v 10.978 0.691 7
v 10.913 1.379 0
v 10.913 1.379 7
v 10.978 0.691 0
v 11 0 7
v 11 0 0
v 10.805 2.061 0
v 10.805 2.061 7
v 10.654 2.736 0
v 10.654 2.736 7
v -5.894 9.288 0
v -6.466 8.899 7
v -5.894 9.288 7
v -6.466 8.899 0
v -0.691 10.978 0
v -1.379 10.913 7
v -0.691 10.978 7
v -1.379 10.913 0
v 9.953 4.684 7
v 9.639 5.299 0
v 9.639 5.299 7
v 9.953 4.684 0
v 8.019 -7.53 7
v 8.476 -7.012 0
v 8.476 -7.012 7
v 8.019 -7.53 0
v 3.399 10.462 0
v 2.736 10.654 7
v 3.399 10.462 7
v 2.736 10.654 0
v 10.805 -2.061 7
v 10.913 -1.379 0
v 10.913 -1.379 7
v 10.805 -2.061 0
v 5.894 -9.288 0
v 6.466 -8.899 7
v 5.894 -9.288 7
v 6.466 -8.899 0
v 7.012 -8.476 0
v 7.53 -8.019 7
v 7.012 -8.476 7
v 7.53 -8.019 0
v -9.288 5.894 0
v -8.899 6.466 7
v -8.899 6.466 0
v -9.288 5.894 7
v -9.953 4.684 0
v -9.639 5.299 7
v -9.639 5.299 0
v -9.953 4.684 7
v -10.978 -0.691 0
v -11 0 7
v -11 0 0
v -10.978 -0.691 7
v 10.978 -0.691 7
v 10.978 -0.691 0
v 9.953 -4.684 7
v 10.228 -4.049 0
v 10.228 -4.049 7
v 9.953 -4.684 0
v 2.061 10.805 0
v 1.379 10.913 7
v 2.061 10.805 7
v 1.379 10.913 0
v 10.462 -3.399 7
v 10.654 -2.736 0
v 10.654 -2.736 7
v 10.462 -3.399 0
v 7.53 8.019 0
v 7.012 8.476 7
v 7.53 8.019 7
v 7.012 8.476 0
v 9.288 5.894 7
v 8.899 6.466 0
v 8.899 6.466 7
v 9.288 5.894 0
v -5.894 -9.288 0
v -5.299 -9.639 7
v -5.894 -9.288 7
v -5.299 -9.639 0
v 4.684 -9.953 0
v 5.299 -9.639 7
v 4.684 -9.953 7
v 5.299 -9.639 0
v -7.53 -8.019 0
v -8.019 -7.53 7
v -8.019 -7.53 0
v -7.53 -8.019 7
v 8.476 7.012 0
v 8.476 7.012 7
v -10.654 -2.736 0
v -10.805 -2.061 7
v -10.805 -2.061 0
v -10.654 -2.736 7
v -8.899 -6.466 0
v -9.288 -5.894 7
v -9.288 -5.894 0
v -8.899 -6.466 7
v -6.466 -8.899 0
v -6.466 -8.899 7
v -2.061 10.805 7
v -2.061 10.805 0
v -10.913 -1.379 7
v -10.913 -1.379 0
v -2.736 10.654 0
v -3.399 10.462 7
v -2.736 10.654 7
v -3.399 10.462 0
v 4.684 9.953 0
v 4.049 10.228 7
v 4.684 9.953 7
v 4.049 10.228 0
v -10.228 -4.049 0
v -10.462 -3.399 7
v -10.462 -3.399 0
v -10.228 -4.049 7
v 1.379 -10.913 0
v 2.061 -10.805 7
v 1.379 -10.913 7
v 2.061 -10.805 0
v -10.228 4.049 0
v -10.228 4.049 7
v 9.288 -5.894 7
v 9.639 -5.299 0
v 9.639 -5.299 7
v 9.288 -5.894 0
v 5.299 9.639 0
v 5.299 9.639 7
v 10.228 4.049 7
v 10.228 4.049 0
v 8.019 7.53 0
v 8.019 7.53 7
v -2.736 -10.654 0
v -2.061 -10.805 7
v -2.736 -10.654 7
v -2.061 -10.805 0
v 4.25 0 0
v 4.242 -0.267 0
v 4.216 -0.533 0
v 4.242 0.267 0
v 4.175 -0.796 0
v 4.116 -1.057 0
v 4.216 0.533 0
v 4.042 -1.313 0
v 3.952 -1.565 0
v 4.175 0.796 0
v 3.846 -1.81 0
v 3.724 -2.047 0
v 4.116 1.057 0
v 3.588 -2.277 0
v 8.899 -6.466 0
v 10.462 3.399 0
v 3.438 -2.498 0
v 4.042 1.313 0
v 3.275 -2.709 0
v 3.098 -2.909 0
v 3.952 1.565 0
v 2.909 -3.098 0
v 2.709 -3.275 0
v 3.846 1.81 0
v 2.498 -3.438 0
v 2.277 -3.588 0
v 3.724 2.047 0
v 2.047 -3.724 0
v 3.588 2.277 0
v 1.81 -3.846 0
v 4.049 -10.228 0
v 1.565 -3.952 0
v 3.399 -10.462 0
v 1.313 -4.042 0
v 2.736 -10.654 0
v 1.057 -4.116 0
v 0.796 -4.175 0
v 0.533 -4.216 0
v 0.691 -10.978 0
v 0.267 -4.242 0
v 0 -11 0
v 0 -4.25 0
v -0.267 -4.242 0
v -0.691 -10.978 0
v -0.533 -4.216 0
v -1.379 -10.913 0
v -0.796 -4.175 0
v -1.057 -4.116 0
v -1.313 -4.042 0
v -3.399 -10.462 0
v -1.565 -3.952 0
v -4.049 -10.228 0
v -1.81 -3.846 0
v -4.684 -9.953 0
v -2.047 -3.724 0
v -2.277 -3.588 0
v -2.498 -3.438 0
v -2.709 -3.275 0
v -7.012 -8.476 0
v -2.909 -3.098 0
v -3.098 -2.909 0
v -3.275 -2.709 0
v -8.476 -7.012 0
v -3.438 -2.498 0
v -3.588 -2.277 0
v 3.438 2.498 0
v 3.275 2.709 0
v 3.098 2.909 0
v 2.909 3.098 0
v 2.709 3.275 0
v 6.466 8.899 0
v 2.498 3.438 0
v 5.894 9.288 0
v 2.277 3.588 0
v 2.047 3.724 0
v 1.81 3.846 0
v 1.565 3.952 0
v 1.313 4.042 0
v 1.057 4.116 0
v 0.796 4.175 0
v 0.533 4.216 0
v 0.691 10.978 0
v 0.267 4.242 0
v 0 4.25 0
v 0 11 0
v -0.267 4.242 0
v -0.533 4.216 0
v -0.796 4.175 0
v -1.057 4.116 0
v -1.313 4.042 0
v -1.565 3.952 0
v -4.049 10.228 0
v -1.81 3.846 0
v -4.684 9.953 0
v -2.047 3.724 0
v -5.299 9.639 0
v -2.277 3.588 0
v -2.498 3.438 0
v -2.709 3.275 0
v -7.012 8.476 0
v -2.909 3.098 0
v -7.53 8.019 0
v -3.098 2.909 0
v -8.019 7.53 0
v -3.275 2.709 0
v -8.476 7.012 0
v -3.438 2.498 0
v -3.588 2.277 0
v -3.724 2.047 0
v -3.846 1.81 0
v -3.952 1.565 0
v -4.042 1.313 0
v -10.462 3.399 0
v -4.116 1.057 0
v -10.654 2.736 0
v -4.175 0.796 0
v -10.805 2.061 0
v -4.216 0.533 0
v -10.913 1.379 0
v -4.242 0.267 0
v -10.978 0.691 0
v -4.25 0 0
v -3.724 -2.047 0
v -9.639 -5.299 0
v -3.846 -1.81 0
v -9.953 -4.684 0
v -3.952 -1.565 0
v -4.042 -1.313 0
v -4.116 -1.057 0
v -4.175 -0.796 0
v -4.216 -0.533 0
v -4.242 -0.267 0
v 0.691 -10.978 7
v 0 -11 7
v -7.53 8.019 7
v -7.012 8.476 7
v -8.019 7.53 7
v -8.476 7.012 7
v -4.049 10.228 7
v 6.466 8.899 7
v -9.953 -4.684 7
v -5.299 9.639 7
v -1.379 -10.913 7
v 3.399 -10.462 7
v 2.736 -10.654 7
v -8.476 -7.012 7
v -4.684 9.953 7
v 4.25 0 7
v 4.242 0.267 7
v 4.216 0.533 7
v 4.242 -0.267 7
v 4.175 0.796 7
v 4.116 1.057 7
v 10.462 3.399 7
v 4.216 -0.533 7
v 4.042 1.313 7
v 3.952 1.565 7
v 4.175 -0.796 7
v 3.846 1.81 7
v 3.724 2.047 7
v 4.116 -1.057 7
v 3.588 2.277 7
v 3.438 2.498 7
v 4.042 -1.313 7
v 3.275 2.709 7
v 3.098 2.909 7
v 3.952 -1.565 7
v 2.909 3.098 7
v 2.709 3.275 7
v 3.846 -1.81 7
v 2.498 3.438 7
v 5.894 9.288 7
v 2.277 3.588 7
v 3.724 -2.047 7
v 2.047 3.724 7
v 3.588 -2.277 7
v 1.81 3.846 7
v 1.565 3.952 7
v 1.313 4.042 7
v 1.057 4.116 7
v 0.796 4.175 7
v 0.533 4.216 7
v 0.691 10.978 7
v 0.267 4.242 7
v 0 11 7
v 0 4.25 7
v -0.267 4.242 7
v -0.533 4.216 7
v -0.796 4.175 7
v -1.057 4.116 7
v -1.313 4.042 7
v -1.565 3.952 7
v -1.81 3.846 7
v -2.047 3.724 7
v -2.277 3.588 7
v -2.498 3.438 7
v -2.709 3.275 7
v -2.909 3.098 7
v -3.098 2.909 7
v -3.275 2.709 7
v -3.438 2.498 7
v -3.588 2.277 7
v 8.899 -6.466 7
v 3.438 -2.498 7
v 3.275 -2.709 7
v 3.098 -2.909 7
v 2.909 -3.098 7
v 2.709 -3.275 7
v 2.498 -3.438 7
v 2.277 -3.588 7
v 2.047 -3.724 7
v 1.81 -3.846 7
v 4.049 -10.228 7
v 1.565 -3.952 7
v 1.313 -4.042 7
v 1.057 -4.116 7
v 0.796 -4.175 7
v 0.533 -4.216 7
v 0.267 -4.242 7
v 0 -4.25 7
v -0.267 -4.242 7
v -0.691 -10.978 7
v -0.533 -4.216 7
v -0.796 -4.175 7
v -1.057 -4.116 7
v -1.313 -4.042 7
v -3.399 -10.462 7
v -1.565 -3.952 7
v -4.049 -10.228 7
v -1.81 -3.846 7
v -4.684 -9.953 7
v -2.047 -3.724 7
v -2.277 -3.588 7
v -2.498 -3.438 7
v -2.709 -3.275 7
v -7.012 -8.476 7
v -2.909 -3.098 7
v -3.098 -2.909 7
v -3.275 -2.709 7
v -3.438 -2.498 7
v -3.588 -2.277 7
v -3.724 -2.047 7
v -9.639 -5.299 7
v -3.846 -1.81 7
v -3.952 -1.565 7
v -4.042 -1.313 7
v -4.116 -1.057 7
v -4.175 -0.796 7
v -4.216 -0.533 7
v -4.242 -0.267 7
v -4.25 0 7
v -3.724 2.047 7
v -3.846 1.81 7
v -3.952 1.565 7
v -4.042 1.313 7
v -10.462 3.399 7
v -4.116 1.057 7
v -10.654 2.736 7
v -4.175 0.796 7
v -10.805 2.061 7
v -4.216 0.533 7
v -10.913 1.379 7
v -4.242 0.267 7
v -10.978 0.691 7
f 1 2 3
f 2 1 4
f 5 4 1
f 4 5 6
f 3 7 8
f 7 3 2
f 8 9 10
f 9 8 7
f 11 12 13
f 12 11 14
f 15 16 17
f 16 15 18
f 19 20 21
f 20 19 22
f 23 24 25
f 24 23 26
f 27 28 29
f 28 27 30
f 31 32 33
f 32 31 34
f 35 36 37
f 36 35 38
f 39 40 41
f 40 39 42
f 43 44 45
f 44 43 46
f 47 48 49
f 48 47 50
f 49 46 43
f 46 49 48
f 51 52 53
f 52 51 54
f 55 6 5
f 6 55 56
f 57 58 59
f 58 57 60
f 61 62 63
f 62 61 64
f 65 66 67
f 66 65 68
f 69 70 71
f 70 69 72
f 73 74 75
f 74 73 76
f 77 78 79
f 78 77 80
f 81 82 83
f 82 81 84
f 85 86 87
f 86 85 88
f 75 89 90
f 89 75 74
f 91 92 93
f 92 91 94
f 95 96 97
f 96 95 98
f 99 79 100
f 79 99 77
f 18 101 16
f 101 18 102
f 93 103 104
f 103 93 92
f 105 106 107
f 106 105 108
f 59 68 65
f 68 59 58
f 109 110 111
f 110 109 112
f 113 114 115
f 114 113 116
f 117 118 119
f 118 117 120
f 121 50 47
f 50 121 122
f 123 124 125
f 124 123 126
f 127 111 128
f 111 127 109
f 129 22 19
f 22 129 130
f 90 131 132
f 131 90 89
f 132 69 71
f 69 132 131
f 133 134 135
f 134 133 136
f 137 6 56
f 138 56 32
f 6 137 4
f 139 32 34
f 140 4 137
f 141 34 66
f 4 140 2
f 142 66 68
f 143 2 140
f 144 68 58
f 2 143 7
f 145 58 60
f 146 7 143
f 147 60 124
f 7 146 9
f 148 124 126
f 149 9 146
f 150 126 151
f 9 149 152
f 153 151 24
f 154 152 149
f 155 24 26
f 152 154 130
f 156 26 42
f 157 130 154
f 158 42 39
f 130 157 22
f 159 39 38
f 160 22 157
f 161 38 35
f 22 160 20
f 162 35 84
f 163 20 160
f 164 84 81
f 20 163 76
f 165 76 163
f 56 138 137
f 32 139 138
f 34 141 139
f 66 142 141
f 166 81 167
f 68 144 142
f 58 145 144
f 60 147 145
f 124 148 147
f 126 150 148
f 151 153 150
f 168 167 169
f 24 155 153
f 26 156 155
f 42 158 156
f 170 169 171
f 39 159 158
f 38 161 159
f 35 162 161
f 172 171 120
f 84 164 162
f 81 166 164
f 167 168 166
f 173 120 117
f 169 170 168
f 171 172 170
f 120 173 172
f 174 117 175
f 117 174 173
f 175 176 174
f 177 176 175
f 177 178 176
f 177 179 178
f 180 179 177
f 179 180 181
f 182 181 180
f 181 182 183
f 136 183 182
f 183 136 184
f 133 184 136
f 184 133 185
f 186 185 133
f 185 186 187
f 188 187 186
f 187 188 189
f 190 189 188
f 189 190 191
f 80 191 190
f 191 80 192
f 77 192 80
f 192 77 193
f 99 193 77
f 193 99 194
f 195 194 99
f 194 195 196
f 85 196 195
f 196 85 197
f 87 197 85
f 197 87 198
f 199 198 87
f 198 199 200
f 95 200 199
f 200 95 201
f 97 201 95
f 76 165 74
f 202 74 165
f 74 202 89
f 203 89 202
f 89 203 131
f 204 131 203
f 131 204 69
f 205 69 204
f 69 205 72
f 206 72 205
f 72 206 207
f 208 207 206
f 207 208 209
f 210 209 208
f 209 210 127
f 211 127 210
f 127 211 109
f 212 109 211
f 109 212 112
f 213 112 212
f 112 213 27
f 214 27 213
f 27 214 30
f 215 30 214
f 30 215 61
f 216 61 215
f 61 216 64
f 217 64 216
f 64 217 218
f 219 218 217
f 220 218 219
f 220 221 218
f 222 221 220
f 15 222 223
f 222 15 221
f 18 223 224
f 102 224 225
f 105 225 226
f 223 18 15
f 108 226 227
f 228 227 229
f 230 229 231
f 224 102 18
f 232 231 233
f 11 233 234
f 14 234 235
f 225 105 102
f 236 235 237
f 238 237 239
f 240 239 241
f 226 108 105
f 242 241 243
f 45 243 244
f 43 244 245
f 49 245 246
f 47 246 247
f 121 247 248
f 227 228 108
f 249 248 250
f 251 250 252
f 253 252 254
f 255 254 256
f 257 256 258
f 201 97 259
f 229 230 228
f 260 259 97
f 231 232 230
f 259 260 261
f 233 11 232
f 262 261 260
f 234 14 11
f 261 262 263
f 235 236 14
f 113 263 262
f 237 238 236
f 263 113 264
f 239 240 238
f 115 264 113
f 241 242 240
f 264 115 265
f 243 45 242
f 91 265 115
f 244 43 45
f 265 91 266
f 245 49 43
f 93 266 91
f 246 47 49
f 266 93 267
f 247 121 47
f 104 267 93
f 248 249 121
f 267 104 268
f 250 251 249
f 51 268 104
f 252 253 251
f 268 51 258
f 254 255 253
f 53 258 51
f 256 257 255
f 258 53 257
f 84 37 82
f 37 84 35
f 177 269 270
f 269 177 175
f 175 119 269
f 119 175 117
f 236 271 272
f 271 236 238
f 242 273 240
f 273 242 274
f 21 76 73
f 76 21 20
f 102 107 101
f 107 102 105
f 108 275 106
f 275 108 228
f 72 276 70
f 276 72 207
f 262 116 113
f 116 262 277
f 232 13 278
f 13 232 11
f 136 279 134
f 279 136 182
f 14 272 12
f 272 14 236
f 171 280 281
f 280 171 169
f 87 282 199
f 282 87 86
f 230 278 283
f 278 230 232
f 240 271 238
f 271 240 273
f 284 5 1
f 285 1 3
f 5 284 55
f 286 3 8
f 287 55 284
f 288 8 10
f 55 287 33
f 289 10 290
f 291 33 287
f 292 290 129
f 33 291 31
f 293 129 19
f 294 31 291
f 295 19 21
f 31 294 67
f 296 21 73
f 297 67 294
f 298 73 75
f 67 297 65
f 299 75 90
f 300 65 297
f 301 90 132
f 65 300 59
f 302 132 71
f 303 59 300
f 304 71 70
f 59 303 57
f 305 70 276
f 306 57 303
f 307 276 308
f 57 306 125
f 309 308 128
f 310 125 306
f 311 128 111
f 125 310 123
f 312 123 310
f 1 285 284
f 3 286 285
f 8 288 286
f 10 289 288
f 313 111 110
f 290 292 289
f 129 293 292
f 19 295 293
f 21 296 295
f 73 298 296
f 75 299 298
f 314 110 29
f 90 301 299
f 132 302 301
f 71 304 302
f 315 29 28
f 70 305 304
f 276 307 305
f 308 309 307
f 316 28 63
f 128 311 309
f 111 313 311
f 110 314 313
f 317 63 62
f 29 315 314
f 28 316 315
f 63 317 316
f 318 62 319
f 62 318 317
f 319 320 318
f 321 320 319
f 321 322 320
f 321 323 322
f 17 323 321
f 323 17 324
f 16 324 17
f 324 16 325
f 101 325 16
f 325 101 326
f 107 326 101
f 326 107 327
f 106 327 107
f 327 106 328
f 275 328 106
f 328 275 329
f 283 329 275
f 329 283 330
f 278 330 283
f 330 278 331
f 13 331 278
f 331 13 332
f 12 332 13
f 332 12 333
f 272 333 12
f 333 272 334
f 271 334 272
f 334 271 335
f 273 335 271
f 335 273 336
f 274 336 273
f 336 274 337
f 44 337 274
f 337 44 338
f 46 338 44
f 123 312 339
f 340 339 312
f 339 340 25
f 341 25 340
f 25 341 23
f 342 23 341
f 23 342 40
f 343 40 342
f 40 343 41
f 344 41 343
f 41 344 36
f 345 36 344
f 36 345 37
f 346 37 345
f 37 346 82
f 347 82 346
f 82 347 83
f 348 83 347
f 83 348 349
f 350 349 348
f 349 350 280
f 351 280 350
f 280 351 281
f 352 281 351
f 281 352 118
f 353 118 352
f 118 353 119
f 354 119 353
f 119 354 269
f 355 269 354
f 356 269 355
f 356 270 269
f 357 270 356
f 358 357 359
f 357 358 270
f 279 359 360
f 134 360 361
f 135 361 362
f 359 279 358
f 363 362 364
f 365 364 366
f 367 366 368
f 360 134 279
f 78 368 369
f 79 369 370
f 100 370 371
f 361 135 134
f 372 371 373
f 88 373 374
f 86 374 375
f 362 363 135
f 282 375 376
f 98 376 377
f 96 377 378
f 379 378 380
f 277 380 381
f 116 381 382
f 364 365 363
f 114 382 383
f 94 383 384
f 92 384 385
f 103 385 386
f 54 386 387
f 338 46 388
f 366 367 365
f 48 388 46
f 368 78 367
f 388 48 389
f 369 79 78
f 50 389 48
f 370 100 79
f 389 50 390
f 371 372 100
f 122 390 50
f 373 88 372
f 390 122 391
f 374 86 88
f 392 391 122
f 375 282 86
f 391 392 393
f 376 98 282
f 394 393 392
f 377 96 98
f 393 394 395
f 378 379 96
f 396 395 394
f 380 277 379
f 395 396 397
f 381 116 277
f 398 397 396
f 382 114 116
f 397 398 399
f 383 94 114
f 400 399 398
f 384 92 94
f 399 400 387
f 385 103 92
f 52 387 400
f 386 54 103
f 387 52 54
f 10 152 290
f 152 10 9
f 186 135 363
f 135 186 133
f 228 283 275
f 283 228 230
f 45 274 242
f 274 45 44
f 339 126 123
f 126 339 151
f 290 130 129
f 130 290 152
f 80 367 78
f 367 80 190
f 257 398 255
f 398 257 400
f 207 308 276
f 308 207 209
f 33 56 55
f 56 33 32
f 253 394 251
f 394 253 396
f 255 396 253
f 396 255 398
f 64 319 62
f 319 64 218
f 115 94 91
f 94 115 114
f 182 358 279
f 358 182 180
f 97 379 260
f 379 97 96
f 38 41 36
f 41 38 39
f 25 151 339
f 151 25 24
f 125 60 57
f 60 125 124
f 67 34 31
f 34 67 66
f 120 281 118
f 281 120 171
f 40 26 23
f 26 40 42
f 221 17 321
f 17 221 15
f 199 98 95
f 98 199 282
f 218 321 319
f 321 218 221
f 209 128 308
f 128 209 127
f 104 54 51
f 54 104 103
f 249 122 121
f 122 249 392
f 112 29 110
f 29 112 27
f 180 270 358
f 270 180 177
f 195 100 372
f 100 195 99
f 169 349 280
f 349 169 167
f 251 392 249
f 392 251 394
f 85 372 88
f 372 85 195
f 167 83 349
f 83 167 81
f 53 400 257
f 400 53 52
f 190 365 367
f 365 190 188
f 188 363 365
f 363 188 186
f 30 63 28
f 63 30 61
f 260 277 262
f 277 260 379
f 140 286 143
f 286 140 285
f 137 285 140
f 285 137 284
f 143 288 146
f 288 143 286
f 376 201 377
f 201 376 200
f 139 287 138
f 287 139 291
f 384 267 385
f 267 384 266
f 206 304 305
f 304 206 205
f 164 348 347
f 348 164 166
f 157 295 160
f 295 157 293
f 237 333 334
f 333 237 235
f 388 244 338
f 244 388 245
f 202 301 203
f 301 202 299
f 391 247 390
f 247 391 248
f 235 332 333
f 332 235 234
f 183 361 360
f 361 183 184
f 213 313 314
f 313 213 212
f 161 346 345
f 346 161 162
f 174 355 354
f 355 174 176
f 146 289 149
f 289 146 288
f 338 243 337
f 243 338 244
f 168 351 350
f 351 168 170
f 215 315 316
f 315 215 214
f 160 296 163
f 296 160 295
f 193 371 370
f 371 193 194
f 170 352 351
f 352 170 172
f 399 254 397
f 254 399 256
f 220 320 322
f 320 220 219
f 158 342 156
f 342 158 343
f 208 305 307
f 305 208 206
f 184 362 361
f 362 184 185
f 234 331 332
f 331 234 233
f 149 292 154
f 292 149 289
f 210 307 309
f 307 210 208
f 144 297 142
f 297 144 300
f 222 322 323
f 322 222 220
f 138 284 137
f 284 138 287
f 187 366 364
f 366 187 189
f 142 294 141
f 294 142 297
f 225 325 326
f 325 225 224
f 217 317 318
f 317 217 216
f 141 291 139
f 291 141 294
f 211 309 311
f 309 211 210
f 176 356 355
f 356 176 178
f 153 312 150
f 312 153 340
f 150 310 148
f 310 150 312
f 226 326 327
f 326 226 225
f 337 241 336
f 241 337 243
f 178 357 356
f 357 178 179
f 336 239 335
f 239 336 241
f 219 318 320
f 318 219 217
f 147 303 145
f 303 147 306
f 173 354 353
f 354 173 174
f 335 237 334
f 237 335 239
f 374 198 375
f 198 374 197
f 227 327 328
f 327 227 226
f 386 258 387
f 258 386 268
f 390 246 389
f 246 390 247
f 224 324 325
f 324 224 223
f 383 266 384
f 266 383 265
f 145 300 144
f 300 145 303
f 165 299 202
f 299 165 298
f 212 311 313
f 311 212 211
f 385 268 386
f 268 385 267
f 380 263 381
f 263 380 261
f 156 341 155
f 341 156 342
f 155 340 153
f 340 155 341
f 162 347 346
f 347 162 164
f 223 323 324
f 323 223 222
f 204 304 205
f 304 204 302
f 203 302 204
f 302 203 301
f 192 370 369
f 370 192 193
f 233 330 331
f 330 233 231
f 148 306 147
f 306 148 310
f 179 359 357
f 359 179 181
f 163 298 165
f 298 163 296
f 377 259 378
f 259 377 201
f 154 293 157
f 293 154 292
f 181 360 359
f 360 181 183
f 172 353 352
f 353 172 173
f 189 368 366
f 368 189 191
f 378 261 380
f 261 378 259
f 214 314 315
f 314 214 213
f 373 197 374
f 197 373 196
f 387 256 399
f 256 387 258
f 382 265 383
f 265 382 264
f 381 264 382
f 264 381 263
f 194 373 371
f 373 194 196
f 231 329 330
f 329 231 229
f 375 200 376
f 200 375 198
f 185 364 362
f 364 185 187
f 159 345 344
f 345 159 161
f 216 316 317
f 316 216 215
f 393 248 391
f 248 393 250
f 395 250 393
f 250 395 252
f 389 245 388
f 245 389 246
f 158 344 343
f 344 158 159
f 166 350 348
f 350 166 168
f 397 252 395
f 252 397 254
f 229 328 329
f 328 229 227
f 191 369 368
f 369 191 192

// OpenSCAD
$fn = 100;

module bearing_608(){
    difference(){
        cylinder(d=22, h = 7);
        cylinder(d=8.5, h = 7);
    }
}



bearing_608();
